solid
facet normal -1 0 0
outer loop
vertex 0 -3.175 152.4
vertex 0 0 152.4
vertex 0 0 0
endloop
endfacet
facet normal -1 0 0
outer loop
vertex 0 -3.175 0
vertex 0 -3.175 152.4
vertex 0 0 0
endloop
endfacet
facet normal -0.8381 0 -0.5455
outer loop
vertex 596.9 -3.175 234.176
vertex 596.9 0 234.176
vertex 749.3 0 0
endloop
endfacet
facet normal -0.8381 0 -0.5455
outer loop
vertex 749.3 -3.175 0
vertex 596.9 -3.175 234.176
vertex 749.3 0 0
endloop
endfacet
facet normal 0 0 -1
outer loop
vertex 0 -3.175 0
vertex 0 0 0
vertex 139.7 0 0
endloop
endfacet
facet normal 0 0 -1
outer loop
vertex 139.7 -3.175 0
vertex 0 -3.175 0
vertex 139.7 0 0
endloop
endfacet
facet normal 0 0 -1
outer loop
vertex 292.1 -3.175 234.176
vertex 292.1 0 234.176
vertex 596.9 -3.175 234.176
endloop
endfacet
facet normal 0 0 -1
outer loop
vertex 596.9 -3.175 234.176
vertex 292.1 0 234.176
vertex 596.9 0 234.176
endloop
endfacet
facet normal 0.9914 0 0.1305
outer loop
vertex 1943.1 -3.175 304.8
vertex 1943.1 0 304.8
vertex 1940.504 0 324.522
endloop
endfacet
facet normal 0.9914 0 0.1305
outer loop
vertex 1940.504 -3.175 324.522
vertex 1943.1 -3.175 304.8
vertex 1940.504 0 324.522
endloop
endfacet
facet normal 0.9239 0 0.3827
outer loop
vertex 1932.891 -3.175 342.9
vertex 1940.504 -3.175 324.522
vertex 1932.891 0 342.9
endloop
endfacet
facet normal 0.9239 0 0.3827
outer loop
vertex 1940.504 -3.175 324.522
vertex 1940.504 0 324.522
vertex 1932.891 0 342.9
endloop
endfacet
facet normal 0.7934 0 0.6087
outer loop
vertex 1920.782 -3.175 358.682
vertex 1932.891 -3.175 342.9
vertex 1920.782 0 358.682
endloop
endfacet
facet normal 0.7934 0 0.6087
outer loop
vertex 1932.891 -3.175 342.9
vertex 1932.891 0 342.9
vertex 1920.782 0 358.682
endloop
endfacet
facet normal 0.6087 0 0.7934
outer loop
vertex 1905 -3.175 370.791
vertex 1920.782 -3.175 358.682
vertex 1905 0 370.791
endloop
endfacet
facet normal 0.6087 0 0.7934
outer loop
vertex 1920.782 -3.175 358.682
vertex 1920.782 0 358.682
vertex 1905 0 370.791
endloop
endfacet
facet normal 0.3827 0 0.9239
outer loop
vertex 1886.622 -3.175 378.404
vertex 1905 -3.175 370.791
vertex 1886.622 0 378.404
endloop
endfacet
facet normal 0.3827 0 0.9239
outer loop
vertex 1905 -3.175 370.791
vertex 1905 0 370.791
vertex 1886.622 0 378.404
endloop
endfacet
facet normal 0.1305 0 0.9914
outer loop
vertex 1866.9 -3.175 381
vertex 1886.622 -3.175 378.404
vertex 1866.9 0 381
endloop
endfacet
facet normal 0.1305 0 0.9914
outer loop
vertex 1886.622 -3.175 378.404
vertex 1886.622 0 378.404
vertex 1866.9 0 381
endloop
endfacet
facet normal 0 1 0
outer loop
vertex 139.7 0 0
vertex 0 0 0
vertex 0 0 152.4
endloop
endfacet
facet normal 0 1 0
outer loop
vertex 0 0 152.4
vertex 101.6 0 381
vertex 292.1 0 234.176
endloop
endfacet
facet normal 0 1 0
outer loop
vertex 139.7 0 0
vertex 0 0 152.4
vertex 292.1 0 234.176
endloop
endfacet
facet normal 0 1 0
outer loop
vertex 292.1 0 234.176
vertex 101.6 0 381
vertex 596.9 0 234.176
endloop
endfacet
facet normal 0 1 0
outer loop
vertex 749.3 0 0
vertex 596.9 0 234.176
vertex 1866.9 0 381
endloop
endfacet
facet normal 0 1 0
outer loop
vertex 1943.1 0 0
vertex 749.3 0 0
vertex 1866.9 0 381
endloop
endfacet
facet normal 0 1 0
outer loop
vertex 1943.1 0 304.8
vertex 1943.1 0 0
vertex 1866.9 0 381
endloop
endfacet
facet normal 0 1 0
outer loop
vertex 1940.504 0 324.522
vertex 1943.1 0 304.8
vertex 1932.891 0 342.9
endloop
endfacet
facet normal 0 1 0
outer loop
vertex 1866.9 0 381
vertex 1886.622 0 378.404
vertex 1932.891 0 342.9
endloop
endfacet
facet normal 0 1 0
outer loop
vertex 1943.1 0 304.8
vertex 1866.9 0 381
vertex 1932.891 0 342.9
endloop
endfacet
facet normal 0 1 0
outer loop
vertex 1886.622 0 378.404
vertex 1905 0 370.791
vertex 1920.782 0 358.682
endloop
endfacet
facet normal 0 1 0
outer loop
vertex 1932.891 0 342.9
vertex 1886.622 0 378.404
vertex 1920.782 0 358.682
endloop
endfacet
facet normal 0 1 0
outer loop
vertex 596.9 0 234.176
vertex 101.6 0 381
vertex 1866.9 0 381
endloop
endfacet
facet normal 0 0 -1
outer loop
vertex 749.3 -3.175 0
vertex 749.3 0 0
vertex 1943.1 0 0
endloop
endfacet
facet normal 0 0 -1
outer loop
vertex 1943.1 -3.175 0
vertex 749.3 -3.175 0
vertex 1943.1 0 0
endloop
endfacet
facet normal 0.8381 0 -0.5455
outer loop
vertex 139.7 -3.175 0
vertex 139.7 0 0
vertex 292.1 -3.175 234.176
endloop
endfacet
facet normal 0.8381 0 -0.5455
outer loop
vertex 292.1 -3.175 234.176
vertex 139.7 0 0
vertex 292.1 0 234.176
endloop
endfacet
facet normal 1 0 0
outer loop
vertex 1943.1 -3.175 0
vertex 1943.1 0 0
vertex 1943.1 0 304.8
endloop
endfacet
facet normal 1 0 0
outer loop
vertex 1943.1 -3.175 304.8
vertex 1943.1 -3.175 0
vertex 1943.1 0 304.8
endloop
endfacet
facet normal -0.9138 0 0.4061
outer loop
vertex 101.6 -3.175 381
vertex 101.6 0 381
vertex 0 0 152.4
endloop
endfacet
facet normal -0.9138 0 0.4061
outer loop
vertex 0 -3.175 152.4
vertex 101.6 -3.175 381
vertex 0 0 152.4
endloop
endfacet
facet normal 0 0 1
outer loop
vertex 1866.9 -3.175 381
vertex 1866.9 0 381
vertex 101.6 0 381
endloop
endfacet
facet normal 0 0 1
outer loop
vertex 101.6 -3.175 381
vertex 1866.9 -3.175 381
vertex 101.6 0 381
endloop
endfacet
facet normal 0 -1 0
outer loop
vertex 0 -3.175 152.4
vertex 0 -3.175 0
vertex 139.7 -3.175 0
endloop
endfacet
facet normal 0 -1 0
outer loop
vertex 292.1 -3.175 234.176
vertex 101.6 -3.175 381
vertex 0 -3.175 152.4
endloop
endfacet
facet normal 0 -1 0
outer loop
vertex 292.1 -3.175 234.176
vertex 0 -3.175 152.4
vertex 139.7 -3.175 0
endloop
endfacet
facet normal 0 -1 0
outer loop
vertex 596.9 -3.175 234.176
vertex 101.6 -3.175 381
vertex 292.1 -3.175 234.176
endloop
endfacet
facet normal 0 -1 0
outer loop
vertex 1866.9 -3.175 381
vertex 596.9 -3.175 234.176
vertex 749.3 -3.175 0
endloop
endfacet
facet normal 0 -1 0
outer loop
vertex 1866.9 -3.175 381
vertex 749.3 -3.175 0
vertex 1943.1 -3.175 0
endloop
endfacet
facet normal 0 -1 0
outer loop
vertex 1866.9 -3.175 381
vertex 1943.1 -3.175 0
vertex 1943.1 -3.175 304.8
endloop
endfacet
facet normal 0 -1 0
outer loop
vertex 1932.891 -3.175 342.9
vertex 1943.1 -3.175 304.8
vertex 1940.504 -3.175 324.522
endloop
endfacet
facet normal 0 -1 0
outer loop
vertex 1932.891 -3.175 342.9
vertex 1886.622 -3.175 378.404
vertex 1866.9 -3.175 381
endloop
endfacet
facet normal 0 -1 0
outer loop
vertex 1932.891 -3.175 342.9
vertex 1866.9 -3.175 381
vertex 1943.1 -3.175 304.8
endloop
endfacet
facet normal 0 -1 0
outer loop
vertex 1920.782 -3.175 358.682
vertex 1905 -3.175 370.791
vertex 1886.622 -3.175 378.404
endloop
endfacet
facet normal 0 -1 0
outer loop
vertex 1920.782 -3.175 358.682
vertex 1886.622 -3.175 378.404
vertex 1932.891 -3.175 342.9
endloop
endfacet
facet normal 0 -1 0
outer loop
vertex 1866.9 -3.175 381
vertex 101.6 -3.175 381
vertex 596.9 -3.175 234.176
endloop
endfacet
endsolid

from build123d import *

# Parameters (mm, degrees)
F1_DEPTH = 3.175


with BuildPart() as f1:
    # F0 (on Front) → F1 (new body)
    with BuildSketch(Plane.XZ):
        with BuildLine():
            Line((0, 152.4), (0, 0))
            Line((0, 0), (139.7, 0))
            Line((139.7, 0), (292.1, 234.176429))
            Line((292.1, 234.176429), (596.9, 234.176429))
            Line((596.9, 234.176429), (749.3, 0))
            Line((749.3, 0), (1943.1, 0))
            Line((1943.1, 0), (1943.1, 304.8))
            ThreePointArc((1943.1, 304.8), (1920.781537, 358.681537), (1866.9, 381))
            Line((1866.9, 381), (101.6, 381))
            Line((101.6, 381), (0, 152.4))
        make_face()
    extrude(amount=F1_DEPTH)


solid = f1.part
